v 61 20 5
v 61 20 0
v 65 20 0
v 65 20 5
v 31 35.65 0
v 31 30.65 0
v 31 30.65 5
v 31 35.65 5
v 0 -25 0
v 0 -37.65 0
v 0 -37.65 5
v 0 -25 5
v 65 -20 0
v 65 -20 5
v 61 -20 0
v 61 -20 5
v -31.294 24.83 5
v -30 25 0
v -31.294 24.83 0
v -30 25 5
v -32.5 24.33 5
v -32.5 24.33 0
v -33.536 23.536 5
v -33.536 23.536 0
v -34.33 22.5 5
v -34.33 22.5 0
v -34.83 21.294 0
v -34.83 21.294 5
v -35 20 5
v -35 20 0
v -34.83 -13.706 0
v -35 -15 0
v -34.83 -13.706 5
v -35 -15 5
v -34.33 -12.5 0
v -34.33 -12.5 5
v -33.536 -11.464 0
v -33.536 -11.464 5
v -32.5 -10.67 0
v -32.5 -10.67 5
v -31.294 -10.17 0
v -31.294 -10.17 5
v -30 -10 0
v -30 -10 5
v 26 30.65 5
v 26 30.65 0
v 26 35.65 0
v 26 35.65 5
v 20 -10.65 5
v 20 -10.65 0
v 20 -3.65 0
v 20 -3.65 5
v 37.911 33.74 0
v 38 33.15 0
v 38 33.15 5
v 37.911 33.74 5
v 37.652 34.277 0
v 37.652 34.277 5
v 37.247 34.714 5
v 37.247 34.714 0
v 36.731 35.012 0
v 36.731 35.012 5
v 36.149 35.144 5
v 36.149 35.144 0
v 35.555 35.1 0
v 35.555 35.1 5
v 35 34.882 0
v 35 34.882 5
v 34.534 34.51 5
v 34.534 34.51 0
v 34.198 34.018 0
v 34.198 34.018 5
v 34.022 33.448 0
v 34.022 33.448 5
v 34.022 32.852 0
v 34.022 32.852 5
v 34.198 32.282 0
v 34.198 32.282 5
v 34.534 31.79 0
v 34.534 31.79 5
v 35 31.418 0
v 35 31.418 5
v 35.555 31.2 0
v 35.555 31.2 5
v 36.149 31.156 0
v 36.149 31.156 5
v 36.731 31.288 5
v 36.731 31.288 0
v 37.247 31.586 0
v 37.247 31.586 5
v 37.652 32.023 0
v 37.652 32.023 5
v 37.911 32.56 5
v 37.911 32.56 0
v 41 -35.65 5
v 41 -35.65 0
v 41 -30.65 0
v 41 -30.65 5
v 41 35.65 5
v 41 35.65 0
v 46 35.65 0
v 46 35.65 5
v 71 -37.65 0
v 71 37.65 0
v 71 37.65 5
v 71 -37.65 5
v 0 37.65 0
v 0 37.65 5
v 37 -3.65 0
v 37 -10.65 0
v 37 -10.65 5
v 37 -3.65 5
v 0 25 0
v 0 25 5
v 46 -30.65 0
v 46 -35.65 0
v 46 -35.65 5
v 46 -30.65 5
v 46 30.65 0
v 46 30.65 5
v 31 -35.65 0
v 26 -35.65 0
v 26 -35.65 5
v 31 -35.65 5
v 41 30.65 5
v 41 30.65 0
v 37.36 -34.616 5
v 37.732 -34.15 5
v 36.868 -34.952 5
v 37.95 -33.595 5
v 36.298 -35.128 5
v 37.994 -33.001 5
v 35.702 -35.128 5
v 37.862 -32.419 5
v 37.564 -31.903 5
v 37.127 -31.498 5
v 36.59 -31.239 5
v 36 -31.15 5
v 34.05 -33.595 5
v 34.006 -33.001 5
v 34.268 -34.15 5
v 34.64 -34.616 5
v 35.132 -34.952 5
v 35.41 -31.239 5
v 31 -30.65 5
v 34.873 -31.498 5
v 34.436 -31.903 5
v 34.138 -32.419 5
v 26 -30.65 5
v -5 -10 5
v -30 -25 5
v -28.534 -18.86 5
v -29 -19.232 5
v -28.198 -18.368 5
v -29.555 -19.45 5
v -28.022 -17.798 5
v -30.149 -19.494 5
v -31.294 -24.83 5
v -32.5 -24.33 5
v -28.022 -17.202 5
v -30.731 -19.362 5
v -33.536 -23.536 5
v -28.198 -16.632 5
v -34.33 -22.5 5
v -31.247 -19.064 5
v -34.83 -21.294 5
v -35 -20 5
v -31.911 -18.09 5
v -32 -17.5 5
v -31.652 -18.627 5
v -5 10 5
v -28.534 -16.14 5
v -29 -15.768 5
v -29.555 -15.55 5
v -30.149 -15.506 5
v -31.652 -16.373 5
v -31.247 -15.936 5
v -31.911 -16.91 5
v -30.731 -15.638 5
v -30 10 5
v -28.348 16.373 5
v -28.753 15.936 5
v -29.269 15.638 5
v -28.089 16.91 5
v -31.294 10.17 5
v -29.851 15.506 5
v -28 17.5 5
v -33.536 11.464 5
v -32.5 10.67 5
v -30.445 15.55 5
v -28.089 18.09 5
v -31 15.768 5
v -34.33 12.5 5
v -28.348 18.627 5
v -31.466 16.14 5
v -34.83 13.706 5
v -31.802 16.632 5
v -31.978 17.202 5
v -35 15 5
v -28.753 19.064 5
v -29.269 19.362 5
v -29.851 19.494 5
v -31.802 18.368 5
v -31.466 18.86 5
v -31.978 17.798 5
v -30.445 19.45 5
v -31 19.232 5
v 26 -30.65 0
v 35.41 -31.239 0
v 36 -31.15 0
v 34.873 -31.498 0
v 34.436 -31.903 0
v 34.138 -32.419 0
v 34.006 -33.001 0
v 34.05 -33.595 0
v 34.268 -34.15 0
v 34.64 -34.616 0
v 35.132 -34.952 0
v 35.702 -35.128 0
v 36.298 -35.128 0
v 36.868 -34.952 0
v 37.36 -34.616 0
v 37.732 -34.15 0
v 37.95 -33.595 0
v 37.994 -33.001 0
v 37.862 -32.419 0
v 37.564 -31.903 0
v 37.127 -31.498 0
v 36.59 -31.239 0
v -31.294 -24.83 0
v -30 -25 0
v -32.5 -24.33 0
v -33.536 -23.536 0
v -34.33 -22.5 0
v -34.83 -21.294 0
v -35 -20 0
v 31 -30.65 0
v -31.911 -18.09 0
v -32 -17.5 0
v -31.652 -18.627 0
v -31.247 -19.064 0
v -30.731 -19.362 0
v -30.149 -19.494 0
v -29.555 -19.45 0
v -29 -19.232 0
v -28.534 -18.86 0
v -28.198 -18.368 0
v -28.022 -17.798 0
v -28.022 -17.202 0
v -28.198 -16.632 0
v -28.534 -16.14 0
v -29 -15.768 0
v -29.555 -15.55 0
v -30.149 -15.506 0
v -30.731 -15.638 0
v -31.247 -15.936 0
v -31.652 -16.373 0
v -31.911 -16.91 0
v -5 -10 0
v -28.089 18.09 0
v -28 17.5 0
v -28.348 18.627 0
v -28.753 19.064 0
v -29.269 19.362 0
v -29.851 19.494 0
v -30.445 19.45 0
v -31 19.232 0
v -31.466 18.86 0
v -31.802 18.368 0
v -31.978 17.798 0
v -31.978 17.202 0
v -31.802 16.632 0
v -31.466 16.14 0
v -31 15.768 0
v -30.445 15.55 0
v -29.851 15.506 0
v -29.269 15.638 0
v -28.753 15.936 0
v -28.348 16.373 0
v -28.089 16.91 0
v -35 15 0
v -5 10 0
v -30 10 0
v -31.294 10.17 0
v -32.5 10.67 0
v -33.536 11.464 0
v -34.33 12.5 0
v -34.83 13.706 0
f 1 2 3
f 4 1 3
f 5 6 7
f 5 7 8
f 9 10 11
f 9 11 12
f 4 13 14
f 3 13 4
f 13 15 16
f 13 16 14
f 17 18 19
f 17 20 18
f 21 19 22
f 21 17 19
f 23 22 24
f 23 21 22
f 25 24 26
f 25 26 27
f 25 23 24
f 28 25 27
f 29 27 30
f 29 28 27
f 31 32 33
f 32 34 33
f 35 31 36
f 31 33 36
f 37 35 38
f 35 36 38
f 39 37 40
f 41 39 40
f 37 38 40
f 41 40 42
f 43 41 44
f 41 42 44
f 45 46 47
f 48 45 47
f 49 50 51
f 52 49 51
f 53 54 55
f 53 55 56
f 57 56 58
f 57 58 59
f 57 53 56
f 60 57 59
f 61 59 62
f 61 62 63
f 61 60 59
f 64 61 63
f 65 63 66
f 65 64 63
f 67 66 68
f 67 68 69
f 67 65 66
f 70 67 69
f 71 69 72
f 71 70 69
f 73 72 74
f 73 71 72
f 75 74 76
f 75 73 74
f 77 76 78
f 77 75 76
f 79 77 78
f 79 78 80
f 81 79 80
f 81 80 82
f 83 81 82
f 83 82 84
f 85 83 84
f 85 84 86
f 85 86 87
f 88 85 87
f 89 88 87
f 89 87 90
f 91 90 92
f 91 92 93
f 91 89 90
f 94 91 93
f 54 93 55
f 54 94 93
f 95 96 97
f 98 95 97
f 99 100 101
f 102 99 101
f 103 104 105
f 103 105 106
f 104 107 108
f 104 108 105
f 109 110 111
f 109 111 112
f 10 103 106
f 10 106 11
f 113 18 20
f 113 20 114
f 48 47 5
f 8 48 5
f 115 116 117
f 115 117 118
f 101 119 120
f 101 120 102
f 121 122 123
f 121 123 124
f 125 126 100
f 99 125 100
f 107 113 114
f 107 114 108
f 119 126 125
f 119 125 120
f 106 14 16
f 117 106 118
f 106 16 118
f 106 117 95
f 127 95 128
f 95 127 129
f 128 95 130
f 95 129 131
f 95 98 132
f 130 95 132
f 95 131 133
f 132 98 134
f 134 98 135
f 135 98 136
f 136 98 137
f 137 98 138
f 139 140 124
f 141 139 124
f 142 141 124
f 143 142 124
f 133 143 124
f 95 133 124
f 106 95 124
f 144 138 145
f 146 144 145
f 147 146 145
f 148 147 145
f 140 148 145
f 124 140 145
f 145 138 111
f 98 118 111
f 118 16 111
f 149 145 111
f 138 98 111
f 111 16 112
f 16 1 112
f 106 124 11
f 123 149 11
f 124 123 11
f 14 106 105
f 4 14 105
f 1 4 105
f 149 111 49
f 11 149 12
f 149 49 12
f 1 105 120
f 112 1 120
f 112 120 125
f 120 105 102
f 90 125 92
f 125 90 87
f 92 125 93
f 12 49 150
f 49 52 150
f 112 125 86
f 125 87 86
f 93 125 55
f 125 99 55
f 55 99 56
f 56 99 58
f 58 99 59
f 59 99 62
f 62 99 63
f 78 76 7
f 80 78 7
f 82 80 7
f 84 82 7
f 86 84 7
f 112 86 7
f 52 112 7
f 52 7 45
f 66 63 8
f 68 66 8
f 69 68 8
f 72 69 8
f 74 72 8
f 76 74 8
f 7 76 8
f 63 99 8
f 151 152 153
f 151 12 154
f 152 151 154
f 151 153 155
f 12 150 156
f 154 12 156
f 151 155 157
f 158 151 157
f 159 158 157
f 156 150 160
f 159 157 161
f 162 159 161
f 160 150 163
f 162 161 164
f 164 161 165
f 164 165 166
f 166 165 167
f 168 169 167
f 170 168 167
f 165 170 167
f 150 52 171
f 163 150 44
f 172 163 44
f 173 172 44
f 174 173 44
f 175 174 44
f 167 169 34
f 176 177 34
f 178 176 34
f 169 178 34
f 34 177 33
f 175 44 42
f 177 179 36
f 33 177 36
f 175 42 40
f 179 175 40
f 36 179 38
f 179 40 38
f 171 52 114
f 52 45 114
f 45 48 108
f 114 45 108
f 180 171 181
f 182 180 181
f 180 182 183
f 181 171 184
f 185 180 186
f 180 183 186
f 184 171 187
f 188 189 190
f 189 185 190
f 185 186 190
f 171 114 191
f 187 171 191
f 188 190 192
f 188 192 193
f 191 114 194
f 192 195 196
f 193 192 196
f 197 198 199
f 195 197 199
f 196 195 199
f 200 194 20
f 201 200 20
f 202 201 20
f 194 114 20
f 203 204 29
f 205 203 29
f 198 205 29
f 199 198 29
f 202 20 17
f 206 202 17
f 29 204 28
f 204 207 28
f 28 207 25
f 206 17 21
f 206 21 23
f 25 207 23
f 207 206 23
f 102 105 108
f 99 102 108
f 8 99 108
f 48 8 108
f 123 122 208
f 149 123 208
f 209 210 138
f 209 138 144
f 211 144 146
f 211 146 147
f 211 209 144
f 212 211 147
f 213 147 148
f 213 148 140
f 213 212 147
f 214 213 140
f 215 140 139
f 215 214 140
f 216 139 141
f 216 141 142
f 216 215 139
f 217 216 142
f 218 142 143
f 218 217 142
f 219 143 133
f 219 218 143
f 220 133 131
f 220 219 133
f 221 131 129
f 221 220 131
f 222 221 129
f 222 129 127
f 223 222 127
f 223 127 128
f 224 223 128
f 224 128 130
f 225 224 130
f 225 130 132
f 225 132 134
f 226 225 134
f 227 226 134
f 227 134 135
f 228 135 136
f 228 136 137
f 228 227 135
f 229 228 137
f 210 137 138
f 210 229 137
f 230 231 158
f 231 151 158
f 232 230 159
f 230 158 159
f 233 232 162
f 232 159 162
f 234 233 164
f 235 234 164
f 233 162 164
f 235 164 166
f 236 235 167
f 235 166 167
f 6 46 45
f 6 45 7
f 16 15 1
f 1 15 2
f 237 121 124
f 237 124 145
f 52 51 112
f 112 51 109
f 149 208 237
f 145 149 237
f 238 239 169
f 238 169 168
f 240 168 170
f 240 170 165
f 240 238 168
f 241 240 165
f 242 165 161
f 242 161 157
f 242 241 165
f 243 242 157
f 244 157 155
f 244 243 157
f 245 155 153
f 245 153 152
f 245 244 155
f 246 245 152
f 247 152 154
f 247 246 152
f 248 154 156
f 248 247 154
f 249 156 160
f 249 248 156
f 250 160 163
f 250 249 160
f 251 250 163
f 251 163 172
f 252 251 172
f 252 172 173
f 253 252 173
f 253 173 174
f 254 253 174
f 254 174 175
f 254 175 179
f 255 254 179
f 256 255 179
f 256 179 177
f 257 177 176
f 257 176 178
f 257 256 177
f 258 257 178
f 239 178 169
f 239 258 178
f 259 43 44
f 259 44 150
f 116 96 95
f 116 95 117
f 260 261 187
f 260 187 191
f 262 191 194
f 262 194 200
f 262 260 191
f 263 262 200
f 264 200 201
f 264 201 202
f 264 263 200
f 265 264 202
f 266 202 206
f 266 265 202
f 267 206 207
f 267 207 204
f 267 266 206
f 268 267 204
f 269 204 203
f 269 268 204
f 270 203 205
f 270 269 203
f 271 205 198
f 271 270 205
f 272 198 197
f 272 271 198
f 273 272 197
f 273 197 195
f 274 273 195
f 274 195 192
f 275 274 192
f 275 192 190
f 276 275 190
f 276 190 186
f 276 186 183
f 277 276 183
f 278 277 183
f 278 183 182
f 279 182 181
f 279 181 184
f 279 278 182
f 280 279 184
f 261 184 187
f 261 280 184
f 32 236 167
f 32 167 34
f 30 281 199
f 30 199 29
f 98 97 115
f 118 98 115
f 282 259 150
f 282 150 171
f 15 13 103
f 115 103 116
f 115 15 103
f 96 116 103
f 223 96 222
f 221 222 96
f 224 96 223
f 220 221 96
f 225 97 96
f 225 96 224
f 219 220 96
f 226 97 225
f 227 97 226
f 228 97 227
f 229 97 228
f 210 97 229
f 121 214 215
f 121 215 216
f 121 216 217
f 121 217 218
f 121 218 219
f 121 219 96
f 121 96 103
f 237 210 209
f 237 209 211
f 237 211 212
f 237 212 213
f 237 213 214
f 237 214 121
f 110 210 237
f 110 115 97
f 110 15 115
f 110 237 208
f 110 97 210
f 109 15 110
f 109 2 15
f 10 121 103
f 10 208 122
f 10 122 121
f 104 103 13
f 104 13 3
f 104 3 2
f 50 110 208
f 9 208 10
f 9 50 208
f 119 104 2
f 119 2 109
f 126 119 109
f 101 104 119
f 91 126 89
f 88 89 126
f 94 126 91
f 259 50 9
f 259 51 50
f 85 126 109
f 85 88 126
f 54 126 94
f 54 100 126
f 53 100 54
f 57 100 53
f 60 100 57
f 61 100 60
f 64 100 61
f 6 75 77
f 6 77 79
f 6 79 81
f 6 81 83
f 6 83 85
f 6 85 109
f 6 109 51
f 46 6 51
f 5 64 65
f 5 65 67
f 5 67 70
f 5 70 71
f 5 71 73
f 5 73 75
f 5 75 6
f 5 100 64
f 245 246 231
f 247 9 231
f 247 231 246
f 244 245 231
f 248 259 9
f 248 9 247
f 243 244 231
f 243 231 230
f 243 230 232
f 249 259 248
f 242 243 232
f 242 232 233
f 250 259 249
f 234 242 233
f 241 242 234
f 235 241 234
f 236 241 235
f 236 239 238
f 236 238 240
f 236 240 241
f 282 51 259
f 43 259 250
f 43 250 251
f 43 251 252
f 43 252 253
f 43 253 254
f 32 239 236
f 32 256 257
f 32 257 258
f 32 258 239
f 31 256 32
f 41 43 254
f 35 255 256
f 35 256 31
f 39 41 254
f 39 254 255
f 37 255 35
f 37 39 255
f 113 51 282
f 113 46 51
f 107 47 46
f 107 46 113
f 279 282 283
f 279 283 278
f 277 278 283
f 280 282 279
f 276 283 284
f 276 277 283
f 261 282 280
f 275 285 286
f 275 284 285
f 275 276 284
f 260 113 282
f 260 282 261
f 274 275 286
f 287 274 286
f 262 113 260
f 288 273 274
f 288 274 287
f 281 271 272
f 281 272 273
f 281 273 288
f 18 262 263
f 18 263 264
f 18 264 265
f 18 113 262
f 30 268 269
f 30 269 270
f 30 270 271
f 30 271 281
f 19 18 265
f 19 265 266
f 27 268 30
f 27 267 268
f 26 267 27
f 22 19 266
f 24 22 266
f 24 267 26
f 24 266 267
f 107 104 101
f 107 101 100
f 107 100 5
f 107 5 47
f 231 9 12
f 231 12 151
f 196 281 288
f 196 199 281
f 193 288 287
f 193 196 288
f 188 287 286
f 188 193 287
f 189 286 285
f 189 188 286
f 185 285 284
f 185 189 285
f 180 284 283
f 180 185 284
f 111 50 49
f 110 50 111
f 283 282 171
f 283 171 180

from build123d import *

# Parameters (mm, degrees)
ESQUISSE1_R        = 2
ESQUISSE1_W        = 17
ESQUISSE1_H        = 7
ESQUISSE1_W_2      = 4
ESQUISSE1_H_2      = 40
ESQUISSE1_W_3      = 5
ESQUISSE1_H_3      = 5
BOSS_EXTRU_1_DEPTH = 5
CONG_1_R           = 5


with BuildPart() as part:
    # Esquisse1 → Boss.-Extru.1 (new body)
    with BuildSketch(Plane.XY):
        Polygon((0, 37.65), (71, 37.65), (71, -37.65), (0, -37.65), (0, -25), (-35, -25), (-35, -10), (-5, -10), (-5, 10), (-35, 10), (-35, 25), (0, 25), align=None)
        with Locations((-30, 17.5)):
            Circle(ESQUISSE1_R, mode=Mode.SUBTRACT)
        with Locations(Location((-30, -17.5, 0), (0, 0, 180))):
            Circle(ESQUISSE1_R, mode=Mode.SUBTRACT)
        with Locations((36, 33.15)):
            Circle(ESQUISSE1_R, mode=Mode.SUBTRACT)
        with Locations(Location((36, -33.15, 0), (0, 0, 90))):
            Circle(ESQUISSE1_R, mode=Mode.SUBTRACT)
        with Locations((28.5, -7.15)):
            Rectangle(ESQUISSE1_W, ESQUISSE1_H, mode=Mode.SUBTRACT)
        with Locations((63, 0)):
            Rectangle(ESQUISSE1_W_2, ESQUISSE1_H_2, mode=Mode.SUBTRACT)
        with Locations((28.5, 33.15)):
            Rectangle(ESQUISSE1_W_3, ESQUISSE1_H_3, mode=Mode.SUBTRACT)
        with Locations((43.5, 33.15)):
            Rectangle(ESQUISSE1_W_3, ESQUISSE1_H_3, mode=Mode.SUBTRACT)
        with Locations((28.5, -33.15)):
            Rectangle(ESQUISSE1_W_3, ESQUISSE1_H_3, mode=Mode.SUBTRACT)
        with Locations((43.5, -33.15)):
            Rectangle(ESQUISSE1_W_3, ESQUISSE1_H_3, mode=Mode.SUBTRACT)
    extrude(amount=BOSS_EXTRU_1_DEPTH)

    # Congé1
    cong_1_edges = [part.edges().sort_by_distance(p)[0] for p in [
        (-35, -10, 2.5),
        (-35, 10, 2.5),
        (-35, 25, 2.5),
        (-35, -25, 2.5),
    ]]
    fillet(cong_1_edges, radius=CONG_1_R)


solid = part.part
